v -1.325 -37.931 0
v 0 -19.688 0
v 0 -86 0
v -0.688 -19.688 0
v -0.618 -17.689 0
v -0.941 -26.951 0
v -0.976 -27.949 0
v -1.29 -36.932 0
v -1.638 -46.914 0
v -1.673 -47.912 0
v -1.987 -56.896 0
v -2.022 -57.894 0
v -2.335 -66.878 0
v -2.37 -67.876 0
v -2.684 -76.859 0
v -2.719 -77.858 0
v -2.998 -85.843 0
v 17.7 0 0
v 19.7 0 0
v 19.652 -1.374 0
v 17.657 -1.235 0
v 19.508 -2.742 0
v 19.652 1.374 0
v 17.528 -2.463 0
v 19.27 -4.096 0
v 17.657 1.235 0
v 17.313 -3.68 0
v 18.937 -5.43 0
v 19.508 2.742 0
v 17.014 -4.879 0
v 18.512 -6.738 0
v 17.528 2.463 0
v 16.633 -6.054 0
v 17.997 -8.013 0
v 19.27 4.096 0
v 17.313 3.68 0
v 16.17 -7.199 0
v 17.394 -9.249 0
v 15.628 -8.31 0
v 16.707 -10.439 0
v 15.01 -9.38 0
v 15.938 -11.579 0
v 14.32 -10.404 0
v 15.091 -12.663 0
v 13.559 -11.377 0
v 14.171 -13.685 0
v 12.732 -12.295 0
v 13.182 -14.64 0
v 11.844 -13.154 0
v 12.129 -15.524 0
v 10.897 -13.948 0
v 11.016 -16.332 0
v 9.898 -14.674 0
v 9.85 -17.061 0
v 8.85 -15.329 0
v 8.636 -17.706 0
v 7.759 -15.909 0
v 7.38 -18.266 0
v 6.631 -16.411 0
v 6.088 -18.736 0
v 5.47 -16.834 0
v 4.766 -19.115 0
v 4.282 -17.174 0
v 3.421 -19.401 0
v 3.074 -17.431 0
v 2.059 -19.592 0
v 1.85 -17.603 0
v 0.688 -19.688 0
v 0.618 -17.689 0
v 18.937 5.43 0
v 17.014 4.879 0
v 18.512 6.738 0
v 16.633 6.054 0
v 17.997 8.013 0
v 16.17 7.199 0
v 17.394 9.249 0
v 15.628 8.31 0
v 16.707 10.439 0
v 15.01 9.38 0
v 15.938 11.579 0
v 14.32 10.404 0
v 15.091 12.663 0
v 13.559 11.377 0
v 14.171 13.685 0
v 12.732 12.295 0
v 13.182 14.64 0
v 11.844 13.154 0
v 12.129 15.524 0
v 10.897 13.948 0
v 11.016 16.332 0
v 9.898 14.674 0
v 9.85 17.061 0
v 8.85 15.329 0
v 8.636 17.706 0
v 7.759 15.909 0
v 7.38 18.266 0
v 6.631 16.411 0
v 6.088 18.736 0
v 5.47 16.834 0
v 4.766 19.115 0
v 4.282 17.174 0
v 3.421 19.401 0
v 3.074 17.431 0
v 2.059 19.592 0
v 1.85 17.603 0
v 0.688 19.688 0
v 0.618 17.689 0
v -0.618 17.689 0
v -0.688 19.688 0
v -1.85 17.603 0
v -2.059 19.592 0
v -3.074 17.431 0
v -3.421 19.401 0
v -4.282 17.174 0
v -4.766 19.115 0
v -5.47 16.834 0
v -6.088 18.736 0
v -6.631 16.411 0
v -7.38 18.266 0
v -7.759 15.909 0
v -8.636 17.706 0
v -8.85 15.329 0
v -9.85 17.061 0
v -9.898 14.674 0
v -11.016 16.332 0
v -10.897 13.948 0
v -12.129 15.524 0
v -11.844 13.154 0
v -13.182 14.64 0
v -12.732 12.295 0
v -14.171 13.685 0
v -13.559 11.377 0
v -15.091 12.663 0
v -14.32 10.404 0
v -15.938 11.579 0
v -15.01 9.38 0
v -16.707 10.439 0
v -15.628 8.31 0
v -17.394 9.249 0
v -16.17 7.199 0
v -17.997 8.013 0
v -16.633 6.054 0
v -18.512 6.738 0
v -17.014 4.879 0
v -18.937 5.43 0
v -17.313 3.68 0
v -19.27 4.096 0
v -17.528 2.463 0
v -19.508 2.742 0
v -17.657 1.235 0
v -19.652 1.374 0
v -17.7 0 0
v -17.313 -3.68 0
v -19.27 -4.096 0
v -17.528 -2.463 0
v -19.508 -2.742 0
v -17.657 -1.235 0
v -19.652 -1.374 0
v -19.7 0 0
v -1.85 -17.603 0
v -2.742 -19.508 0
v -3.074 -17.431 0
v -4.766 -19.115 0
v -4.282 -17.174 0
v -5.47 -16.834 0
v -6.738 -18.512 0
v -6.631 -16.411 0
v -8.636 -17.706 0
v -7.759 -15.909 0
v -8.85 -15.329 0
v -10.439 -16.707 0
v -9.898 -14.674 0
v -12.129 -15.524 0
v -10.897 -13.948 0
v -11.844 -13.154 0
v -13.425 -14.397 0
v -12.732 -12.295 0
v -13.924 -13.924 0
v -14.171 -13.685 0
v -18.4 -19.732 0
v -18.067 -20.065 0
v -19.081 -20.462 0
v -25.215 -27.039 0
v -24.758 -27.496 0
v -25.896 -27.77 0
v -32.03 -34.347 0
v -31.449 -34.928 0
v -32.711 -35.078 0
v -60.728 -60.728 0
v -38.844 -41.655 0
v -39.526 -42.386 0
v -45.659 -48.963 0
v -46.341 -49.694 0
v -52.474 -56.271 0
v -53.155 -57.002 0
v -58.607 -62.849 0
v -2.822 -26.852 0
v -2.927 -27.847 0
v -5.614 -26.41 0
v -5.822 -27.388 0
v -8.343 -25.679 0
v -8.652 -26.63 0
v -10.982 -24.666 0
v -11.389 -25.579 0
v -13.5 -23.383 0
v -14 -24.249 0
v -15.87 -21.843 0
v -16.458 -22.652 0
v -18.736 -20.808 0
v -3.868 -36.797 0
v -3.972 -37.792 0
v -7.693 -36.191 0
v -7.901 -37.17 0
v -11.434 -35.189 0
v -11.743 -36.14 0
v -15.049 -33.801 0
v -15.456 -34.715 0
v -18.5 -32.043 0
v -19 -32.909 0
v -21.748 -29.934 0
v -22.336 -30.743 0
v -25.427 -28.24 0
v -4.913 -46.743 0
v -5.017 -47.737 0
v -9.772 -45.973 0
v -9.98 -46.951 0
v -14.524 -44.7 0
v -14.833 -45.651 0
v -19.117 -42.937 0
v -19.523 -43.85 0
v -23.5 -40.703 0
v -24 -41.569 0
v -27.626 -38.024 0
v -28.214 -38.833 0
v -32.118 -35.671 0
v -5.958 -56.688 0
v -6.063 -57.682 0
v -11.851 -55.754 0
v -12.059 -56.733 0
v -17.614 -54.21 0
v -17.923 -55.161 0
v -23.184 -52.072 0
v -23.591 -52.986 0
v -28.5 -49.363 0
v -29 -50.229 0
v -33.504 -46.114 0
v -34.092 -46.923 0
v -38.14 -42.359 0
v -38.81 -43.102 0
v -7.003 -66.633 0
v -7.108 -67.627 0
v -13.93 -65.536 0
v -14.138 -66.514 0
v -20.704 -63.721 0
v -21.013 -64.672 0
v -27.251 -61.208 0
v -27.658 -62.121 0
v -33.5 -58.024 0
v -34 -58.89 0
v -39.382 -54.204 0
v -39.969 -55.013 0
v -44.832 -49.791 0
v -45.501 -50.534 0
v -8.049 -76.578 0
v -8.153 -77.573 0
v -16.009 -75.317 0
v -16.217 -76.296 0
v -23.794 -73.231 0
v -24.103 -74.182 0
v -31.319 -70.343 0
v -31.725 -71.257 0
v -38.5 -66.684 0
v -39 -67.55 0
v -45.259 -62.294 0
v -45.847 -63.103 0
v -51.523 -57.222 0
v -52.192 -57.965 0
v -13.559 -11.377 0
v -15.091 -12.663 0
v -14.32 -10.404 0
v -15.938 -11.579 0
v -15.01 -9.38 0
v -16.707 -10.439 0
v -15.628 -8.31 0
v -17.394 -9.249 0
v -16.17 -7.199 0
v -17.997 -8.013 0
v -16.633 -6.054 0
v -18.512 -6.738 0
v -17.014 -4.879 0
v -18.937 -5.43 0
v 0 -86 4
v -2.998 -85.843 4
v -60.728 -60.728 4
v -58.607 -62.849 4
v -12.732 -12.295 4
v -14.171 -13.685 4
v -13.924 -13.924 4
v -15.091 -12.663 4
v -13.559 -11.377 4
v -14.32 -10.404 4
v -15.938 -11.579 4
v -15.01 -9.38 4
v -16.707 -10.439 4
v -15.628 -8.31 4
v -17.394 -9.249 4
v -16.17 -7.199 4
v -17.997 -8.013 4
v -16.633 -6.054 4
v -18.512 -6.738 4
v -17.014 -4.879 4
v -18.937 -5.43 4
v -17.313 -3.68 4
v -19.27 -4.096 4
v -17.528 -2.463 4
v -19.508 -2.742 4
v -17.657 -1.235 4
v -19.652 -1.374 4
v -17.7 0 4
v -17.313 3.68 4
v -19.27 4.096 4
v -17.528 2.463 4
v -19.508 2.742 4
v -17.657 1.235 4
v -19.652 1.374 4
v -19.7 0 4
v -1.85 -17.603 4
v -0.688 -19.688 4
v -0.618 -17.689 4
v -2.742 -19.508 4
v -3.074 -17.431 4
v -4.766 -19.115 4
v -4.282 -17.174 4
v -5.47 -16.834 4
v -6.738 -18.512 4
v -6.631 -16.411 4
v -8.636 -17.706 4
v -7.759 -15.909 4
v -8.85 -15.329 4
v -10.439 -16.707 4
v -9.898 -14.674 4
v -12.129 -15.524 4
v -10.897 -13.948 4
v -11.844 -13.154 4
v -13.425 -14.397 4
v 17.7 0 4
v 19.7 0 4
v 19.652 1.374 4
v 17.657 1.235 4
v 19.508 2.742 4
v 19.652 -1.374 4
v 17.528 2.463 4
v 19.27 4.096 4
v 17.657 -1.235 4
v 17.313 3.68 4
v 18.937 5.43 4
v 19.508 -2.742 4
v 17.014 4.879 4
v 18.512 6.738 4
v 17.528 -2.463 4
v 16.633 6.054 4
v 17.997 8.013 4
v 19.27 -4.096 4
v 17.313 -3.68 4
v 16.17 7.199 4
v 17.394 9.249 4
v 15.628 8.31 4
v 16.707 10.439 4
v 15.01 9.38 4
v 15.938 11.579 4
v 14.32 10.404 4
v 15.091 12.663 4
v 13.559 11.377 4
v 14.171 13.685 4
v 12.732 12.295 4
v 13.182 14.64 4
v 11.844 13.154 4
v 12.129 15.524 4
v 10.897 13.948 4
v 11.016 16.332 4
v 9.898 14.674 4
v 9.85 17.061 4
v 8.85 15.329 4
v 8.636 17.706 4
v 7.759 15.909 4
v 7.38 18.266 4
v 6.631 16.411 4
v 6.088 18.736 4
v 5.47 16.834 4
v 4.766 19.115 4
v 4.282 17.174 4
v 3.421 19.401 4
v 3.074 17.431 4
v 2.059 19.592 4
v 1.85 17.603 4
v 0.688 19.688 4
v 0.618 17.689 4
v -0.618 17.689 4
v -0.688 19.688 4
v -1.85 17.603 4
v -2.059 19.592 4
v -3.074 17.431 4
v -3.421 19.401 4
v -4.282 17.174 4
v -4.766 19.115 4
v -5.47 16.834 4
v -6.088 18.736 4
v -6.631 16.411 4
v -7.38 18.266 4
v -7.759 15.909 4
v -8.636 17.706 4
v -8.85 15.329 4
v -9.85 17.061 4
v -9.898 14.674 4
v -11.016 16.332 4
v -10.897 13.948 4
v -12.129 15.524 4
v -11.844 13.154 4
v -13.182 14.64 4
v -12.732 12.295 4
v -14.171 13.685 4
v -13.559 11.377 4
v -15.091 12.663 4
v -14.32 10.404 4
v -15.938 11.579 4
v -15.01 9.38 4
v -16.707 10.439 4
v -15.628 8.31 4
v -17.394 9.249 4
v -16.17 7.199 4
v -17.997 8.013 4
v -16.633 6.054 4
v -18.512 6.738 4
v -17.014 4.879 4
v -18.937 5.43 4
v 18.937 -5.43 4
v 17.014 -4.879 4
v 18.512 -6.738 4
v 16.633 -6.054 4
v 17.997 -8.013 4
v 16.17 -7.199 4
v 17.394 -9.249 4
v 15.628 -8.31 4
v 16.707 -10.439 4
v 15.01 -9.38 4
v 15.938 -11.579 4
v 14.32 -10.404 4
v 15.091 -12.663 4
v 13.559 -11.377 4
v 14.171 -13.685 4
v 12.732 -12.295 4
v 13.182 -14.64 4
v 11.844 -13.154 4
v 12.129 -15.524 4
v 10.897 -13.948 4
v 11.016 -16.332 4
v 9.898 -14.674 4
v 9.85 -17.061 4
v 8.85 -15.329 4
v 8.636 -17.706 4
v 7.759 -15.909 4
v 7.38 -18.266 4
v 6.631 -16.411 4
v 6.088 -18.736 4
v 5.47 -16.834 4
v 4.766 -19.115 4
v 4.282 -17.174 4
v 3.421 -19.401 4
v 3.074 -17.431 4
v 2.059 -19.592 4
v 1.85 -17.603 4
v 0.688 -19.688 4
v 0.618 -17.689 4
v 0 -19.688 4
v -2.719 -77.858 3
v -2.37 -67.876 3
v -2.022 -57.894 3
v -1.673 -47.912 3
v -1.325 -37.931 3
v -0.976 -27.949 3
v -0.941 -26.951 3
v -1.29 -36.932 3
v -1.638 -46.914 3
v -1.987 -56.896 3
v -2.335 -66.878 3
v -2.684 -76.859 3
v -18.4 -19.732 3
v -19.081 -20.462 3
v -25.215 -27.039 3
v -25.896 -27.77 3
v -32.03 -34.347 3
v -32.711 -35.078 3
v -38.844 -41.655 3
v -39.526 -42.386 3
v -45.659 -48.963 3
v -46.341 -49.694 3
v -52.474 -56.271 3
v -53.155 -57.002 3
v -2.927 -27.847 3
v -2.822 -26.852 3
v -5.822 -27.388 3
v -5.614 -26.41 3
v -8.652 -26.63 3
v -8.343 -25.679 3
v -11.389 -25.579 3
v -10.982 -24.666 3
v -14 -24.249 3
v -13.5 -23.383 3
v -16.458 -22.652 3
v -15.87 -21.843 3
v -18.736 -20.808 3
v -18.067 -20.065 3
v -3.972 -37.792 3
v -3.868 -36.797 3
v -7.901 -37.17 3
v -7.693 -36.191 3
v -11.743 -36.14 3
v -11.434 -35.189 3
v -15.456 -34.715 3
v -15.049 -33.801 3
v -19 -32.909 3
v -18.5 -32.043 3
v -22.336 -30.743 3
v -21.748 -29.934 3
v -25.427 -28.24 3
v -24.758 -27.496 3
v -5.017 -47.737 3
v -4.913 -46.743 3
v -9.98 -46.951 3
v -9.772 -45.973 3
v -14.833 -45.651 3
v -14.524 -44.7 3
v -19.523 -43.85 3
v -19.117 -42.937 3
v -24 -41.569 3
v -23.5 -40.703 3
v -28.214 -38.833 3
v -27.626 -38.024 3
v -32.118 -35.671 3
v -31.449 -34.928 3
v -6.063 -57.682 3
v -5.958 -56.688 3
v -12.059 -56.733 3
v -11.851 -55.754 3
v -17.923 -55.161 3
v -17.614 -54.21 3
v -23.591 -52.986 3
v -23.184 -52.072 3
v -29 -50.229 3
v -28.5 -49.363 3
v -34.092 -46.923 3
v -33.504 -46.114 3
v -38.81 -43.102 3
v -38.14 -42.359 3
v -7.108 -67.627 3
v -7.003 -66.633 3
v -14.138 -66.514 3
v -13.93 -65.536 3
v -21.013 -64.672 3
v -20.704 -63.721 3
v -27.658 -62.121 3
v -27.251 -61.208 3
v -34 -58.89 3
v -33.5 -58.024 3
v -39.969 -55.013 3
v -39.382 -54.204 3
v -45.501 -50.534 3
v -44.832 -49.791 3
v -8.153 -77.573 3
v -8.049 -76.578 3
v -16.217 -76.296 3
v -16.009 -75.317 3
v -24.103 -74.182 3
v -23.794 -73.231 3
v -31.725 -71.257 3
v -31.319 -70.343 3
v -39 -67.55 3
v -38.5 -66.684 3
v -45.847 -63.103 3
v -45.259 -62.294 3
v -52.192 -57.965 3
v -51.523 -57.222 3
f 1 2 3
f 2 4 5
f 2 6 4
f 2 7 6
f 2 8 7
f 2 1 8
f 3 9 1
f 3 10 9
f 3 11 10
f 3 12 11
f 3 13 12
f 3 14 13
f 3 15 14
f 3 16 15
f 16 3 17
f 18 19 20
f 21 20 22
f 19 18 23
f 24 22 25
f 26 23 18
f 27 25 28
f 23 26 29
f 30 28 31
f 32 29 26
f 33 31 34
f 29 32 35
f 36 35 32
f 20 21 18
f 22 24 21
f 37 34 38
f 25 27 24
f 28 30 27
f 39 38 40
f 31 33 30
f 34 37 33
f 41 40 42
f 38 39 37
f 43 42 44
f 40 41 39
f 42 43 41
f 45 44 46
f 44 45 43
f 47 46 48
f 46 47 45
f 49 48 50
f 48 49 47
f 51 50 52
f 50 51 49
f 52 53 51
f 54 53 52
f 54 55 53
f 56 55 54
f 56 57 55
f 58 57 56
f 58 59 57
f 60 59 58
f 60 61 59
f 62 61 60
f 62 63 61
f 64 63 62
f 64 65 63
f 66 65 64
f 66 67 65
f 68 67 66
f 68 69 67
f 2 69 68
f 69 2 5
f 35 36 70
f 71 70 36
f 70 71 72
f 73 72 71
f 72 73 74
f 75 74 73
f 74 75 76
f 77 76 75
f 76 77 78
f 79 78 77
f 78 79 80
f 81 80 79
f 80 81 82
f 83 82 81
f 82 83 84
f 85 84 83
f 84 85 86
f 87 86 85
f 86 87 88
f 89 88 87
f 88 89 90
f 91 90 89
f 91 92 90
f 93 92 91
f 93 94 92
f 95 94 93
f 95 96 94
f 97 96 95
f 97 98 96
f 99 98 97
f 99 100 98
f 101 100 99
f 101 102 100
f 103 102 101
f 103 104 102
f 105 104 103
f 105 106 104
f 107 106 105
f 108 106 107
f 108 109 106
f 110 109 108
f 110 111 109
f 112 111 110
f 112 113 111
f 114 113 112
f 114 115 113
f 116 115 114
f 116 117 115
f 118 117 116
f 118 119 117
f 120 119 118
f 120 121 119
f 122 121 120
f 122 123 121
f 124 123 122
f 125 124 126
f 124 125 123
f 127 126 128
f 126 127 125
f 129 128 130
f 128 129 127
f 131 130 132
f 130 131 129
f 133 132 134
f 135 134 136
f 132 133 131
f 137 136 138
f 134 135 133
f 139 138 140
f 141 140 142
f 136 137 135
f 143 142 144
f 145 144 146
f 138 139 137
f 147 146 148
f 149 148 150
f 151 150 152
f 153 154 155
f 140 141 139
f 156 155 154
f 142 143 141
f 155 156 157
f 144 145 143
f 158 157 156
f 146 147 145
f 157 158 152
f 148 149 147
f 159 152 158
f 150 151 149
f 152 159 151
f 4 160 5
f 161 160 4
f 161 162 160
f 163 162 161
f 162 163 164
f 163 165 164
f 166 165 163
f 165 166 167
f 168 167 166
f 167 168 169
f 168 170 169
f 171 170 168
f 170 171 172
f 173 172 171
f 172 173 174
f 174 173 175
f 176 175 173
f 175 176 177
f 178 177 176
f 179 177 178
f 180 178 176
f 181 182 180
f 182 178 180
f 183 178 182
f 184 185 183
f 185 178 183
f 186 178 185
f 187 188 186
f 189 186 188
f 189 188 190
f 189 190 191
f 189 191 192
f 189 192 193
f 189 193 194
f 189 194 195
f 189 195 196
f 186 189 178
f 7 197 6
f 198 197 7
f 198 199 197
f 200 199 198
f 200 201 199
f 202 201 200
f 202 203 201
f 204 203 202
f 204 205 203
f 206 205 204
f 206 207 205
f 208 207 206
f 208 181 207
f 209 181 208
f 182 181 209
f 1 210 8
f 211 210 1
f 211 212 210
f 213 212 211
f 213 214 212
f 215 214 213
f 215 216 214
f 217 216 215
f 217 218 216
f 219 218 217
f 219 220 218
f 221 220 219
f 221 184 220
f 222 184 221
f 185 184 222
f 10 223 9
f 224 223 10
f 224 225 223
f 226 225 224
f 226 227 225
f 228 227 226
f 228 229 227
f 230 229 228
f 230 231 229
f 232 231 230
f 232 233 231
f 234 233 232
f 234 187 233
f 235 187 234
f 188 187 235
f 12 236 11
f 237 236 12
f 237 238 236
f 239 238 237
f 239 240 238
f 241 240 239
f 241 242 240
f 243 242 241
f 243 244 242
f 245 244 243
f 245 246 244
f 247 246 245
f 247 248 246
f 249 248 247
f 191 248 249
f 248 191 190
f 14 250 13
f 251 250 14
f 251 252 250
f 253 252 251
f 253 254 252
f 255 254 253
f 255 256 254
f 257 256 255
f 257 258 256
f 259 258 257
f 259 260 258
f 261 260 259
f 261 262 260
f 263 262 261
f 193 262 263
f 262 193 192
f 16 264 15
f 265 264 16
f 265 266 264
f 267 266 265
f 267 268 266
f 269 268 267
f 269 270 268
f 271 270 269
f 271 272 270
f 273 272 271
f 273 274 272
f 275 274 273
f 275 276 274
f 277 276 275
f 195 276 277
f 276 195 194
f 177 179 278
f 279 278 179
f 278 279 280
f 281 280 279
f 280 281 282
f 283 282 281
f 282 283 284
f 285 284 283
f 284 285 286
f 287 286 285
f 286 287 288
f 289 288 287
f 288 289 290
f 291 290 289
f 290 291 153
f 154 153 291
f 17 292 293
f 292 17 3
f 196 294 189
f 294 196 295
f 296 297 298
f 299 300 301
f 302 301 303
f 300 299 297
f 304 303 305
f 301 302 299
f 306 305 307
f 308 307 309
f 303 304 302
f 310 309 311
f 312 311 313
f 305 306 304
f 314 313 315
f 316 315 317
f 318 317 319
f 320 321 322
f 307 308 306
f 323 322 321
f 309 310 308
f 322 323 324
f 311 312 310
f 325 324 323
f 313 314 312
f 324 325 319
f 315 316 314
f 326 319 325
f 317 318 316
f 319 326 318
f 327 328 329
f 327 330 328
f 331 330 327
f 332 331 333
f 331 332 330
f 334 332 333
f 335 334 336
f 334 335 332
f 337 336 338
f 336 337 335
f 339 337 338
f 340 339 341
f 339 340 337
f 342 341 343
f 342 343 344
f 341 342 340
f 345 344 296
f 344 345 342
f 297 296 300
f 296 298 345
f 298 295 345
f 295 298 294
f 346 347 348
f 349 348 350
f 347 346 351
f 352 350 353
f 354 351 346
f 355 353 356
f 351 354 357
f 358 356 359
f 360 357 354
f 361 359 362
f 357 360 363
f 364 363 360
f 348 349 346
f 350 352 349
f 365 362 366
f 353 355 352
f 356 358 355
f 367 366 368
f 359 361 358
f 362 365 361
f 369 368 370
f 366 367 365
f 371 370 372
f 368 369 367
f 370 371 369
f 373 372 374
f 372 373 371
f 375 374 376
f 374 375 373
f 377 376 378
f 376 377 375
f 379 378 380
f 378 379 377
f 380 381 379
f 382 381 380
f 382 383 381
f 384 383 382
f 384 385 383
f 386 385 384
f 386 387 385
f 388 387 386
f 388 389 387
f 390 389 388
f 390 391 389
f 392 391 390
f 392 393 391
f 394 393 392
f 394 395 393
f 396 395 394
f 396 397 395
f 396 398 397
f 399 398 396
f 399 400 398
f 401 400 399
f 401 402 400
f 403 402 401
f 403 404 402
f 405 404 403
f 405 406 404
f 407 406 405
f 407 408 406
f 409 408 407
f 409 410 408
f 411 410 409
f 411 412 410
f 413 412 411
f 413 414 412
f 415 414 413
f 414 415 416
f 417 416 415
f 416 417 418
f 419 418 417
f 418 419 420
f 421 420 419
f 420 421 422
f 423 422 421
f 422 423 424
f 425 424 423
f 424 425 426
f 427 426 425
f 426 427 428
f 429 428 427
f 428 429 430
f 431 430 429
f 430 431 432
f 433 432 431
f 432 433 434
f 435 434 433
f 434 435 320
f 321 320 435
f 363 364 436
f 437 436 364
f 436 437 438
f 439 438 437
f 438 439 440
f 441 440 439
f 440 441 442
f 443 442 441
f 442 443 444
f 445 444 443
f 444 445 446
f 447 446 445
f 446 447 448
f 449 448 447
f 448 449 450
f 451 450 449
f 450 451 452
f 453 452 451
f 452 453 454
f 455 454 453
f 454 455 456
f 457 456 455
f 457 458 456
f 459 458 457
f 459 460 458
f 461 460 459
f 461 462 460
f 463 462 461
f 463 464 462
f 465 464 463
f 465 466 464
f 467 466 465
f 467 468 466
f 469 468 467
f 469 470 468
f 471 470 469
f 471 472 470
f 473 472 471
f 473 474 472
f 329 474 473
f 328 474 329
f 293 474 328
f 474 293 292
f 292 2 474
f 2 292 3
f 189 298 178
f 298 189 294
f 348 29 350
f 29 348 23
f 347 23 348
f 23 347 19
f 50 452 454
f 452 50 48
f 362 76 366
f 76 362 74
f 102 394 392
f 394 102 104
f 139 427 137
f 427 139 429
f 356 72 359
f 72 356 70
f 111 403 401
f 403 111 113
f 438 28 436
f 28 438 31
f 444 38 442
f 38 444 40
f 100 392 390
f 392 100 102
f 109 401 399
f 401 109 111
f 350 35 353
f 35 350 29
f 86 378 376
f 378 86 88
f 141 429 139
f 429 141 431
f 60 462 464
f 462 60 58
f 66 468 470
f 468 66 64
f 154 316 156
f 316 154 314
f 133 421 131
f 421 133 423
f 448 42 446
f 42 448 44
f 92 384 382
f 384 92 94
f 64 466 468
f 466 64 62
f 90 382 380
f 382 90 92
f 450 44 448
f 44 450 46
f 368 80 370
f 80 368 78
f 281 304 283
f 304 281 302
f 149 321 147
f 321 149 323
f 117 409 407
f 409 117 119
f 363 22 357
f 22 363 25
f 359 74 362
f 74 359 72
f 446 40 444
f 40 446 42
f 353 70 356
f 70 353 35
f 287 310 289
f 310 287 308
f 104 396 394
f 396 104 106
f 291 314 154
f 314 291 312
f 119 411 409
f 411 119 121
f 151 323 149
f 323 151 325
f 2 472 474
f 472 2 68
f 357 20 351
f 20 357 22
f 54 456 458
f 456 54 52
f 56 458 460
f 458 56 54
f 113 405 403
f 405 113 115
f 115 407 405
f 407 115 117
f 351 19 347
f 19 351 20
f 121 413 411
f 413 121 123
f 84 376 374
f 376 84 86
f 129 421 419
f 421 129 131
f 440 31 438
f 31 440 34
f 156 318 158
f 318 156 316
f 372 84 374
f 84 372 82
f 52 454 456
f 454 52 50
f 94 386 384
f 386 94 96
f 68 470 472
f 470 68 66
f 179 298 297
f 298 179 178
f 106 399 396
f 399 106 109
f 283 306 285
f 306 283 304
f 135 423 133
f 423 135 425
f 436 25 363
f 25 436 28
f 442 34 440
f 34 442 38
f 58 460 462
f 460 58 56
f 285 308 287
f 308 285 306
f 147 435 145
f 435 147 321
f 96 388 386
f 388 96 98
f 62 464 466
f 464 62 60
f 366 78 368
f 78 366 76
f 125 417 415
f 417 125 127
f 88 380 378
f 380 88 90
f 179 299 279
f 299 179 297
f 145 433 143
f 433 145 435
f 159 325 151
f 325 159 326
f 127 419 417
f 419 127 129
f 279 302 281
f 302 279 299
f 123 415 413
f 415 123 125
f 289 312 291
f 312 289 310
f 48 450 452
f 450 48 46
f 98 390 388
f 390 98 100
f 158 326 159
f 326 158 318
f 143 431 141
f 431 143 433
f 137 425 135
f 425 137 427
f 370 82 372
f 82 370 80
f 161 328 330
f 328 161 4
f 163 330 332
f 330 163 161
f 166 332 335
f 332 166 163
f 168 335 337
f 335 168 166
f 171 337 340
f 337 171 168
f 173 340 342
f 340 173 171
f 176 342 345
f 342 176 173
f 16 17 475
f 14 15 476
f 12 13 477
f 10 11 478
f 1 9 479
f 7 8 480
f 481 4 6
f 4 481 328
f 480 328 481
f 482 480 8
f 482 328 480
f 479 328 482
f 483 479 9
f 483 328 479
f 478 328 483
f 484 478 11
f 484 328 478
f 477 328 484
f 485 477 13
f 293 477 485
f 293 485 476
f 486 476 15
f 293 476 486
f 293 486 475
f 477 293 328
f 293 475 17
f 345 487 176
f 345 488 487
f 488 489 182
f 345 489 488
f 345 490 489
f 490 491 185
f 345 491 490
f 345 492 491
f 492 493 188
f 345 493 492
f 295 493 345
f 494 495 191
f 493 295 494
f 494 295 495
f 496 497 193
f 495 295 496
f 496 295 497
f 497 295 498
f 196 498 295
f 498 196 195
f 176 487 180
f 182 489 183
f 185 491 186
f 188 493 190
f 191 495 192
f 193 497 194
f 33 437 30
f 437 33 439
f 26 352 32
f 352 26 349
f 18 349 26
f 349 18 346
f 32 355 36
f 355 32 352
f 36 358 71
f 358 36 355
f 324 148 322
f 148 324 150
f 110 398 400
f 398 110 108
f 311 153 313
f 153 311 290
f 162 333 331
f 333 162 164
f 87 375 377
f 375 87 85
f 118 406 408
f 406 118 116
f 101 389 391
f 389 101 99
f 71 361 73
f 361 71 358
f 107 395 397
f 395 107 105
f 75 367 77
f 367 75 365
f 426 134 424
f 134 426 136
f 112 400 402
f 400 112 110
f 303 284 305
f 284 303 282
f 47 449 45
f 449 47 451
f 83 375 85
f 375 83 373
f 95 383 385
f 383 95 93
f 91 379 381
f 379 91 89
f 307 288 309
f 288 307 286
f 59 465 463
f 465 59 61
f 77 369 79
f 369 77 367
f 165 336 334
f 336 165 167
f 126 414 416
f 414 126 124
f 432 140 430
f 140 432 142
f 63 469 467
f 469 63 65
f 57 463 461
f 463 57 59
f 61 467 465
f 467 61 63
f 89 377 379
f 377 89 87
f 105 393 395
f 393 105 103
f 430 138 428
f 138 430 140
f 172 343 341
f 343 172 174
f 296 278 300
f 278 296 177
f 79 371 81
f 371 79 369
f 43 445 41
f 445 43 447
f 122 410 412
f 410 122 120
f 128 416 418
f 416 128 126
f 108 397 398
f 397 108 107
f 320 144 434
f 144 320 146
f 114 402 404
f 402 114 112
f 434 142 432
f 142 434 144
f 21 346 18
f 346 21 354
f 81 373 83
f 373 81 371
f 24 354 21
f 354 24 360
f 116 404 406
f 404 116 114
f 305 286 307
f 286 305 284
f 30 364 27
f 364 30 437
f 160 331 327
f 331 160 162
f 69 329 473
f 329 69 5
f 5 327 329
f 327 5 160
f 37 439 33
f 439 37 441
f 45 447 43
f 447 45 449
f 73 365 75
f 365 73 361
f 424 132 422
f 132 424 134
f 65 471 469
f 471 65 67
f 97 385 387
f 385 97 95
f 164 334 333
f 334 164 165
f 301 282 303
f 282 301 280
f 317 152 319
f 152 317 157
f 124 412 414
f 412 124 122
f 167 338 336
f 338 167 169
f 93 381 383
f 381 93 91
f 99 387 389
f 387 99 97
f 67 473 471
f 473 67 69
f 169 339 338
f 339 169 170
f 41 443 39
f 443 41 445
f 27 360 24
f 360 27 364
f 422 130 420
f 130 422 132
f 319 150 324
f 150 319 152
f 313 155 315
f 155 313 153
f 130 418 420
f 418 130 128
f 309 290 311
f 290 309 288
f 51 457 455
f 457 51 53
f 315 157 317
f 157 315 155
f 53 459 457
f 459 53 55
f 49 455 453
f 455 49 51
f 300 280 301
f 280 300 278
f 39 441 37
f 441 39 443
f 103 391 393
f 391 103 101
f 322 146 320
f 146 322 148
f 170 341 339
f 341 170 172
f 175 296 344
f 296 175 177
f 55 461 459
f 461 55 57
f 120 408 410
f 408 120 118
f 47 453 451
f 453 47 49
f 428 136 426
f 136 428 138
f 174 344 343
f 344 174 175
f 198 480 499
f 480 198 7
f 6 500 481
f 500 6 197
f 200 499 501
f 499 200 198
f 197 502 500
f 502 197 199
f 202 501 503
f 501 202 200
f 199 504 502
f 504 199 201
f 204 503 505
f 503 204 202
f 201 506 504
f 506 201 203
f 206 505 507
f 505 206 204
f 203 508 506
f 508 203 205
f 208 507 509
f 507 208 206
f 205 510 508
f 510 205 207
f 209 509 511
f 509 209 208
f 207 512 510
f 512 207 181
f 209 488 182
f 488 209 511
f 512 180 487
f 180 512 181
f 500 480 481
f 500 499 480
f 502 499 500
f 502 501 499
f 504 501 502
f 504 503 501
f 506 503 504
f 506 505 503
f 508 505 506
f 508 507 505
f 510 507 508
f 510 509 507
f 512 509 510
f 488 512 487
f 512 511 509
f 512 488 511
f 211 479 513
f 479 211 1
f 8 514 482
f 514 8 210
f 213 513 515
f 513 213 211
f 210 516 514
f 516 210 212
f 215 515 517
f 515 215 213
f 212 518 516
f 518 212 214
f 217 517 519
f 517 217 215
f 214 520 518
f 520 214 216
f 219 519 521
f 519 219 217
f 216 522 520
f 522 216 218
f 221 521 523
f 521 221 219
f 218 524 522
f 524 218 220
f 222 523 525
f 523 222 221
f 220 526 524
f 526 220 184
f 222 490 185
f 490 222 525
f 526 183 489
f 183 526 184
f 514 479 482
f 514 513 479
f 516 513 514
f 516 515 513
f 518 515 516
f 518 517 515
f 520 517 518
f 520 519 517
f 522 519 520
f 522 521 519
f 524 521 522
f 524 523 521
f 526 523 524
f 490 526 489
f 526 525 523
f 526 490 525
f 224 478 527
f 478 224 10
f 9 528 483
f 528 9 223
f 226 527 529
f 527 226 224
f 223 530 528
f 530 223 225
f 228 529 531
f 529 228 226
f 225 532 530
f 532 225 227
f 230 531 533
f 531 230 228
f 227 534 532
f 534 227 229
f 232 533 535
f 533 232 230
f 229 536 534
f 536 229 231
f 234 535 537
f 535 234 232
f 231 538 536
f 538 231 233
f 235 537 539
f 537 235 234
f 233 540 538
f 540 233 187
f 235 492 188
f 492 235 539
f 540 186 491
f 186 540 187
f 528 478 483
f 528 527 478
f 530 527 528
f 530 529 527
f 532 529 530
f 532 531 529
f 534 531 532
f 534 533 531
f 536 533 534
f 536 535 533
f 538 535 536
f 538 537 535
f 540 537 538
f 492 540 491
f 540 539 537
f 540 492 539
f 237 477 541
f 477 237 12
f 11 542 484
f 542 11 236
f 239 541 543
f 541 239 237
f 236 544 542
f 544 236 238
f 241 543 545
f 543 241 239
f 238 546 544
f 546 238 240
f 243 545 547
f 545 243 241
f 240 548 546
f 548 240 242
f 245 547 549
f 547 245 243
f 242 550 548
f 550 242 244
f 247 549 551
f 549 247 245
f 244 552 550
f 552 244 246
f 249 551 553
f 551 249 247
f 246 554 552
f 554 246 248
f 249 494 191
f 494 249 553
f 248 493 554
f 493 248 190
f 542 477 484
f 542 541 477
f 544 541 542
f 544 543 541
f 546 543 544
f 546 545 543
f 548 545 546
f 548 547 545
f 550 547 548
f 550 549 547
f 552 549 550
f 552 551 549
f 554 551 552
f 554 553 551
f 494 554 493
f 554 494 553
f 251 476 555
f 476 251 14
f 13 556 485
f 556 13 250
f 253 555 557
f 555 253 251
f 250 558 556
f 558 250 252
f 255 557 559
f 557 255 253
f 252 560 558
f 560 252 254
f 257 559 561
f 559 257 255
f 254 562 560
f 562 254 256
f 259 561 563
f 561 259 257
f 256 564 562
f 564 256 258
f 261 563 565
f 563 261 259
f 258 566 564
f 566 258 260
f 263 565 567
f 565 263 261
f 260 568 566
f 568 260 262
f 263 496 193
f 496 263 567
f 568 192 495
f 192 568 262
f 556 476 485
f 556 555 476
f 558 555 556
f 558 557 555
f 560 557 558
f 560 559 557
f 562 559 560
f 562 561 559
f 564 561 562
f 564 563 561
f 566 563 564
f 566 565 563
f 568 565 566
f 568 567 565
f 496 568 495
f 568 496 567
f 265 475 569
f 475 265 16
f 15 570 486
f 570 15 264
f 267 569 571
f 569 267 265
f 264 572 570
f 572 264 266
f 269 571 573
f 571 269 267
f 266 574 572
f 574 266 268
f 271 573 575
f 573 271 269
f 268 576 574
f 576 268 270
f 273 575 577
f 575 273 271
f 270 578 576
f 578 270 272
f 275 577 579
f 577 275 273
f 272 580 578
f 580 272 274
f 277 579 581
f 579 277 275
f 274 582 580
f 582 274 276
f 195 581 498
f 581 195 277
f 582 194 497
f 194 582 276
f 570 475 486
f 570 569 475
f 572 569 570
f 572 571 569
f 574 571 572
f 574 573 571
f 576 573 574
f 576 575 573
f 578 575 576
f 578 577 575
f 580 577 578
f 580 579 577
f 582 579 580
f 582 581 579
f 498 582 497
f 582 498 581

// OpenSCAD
/*

Desktop Microphone Stand
Author: Keegan Neave
Website: http://neave.engineering

Licenced under Creative Commons Attribution - Non-Commercial - Share Alike 3.0

This is designed for a Shure 10A microphone but simply adjust the inner and outer diameters according to the taper of your mic and print.  This should make for a snug fit.

*/

$fn=90;

inner_diamater_bottom = 35.4;
inner_diamater_top = 35;

inner_radius_bottom = inner_diamater_bottom / 2;
inner_radius_top = inner_diamater_top / 2;


difference()
{
    union()
    {
        //  Base structure to cut from
        cylinder(h=4, r1 = inner_radius_bottom + 2, r2= inner_radius_bottom + 2); 
        arc(36/2, 86, 4, 45);
    }
    cylinder(h=4, r1= inner_radius_bottom, r2= inner_radius_bottom);
    rotate([0,0,-2]) arc(inner_radius_bottom + 2, 87, 4, 41);
}

arc(27, 28, 3, 45);
arc(37, 38, 3, 45);
arc(47, 48, 3, 45);
arc(57, 58, 3, 45);
arc(67, 68, 3, 45);
arc(77, 78, 3, 45);

/* 
 * Excerpt from... 
 * 
 * Parametric Encoder Wheel 
 *
 * by Alex Franke (codecreations), March 2012
 * http://www.theFrankes.com
 * 
 * Licenced under Creative Commons Attribution - Non-Commercial - Share Alike 3.0 
*/
module arc(innerradius, radius, height, degrees ) 
{
    $fn=60;
    
    render() 
    {
            if( degrees > 180 )
            {
                difference()
                {
                  difference()
                    {
                        cylinder( r=radius, h=height );
                        cylinder( r=innerradius*1.0001, h=height );
                    }
                    rotate([0,0,-degrees]) arc( innerradius,radius*1.0001, height*1.0001,  360-degrees) ;                    
                }
            }
            else
            {        
                difference() 
                {    
                    // Outer ring
                    rotate_extrude()
                        translate([innerradius, 0, 0])
                            square([radius - innerradius,height]);
                
                    // Cut half off
                    translate([0,-(radius+1),-.5]) 
                        cube ([radius+1,(radius+1)*2,height+1]);
           
                    // Cover the other half as necessary
                    rotate([0,0,180-degrees])
                    translate([0,-(radius+1),-.5]) 
                        cube ([radius+1,(radius+1)*2,height+1]);
                }
            }
        
    }
}
